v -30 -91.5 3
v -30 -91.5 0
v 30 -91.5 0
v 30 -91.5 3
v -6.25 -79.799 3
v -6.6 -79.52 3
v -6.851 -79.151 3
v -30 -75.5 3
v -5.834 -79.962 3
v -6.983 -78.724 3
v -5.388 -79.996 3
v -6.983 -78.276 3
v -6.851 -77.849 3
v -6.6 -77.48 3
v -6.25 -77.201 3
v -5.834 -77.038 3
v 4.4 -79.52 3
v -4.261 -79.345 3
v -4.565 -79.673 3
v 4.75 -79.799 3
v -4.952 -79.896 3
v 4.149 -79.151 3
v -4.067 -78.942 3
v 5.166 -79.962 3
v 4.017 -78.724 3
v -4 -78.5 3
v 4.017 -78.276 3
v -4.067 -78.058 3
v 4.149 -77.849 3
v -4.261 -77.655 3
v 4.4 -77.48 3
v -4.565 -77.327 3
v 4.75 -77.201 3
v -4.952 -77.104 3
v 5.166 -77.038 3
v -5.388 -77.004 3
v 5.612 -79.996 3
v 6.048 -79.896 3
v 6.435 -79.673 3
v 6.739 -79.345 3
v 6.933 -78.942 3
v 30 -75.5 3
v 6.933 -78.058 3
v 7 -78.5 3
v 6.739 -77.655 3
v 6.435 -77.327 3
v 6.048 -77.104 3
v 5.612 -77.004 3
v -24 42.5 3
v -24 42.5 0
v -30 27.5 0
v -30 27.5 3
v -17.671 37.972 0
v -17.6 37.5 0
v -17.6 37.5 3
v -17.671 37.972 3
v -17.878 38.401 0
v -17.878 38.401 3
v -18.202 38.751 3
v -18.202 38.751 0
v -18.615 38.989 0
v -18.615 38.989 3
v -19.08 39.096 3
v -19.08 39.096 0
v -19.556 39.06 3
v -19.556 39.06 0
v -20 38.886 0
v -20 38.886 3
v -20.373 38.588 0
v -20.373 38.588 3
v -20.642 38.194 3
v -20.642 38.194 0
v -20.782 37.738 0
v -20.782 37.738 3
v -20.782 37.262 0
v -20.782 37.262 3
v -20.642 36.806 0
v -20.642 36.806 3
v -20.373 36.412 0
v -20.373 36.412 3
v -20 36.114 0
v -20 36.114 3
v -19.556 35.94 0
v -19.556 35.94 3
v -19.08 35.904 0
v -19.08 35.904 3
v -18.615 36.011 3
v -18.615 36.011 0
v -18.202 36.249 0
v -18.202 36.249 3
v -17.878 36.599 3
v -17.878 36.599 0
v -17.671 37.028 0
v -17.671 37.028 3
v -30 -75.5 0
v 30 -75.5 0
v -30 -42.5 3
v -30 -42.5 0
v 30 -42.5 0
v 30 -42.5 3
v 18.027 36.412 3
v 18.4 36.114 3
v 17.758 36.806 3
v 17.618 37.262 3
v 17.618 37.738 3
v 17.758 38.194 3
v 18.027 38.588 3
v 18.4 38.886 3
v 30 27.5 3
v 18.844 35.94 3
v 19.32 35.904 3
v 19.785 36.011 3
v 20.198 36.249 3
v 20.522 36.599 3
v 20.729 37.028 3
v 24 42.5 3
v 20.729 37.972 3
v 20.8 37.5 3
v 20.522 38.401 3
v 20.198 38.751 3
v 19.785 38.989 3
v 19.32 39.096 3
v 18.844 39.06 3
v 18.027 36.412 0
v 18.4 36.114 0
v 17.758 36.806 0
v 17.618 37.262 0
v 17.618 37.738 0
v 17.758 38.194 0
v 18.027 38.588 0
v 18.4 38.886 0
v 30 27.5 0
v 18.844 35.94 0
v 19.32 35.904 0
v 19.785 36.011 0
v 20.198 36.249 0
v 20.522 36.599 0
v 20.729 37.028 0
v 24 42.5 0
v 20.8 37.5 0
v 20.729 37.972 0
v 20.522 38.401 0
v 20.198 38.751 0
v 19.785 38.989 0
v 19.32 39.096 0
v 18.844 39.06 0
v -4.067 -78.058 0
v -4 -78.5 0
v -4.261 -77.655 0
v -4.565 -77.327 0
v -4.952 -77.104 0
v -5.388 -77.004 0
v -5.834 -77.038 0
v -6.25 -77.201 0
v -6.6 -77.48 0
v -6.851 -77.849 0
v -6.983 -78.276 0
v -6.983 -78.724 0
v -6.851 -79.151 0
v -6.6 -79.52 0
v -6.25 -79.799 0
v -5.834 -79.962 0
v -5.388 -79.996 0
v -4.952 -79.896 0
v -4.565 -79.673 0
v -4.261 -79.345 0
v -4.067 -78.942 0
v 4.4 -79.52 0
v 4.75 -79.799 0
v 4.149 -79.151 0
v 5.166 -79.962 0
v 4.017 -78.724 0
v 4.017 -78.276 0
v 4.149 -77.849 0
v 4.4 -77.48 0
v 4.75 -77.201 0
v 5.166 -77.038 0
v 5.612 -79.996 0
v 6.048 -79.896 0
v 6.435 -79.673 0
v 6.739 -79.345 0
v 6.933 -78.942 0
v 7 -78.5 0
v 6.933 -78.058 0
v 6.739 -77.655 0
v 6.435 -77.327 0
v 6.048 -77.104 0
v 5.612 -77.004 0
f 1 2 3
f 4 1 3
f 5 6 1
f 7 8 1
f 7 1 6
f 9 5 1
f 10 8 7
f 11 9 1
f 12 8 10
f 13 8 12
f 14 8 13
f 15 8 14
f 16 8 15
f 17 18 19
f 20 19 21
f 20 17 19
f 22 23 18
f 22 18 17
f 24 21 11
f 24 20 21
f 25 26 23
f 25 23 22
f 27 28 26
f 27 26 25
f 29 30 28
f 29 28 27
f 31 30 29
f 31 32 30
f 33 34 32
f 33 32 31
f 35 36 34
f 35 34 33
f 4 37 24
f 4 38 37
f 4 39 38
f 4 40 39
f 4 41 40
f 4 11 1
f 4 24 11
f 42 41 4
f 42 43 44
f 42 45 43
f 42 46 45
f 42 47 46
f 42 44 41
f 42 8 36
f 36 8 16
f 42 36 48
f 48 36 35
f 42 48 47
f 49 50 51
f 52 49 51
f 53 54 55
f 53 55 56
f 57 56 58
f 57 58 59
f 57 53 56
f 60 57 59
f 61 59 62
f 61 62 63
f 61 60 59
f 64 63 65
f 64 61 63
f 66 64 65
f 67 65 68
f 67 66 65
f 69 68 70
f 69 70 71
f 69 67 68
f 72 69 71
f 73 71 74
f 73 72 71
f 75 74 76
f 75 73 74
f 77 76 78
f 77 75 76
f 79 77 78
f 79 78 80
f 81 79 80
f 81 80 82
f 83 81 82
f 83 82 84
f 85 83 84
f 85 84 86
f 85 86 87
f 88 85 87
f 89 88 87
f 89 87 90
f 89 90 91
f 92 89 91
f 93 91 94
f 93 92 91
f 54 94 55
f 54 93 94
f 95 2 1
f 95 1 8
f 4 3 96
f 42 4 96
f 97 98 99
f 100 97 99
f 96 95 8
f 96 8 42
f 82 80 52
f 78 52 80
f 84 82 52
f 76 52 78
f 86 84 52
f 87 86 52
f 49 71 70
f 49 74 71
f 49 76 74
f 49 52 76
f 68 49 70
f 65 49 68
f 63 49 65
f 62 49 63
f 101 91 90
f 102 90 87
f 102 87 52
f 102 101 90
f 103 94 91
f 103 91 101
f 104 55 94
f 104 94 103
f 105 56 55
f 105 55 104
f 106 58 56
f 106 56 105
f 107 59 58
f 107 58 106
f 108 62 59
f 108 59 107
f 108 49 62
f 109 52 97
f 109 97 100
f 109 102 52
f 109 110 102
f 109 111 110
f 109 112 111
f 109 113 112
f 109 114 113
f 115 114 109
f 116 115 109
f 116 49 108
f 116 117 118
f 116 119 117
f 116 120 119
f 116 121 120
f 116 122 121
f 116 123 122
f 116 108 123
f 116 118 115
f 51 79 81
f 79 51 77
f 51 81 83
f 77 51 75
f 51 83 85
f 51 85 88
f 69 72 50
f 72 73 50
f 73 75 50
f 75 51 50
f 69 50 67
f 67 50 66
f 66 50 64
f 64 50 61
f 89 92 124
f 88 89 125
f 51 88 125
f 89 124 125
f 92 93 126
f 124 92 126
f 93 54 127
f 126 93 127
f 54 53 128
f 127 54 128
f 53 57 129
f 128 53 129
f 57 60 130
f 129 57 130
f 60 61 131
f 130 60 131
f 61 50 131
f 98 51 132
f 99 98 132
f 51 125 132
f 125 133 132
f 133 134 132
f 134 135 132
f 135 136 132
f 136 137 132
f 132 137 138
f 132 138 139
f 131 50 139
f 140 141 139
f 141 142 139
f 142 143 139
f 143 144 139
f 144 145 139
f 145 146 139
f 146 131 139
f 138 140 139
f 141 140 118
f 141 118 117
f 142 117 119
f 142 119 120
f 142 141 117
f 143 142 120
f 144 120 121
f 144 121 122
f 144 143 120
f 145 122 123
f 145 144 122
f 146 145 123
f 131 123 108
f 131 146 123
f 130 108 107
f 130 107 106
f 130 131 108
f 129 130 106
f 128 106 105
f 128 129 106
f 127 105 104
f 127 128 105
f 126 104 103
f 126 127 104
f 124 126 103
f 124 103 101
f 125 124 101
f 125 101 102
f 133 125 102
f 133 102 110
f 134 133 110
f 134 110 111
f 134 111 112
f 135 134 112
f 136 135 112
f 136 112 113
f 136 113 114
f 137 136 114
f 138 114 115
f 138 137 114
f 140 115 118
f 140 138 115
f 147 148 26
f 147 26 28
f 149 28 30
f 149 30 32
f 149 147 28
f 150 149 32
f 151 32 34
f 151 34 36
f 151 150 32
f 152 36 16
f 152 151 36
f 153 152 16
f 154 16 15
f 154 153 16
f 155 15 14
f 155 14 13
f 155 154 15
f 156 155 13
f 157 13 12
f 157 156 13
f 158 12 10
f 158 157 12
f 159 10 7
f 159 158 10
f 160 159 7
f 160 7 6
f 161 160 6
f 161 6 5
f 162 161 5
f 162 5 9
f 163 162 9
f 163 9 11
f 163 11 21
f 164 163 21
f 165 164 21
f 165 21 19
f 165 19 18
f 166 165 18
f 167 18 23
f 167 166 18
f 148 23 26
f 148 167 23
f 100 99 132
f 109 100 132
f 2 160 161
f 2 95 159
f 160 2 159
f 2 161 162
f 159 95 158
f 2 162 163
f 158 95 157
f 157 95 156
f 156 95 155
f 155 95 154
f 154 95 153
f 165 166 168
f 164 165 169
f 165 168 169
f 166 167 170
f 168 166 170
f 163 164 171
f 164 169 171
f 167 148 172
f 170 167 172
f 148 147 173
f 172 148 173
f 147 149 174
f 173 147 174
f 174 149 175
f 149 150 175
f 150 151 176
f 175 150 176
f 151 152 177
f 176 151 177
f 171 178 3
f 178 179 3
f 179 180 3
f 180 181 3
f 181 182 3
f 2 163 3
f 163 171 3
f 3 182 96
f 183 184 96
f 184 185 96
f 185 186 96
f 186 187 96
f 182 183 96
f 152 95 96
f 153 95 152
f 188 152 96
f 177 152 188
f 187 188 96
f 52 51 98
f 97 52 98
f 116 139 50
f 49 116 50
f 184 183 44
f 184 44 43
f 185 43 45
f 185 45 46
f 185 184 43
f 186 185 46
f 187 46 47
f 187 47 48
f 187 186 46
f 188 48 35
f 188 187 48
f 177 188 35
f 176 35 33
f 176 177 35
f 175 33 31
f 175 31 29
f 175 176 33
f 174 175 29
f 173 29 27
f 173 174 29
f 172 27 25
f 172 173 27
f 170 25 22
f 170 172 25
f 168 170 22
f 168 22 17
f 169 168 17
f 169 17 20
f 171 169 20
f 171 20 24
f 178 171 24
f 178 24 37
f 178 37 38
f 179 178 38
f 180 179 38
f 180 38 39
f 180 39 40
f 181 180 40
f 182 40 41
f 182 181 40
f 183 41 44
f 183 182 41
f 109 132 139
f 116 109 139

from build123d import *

# Parameters (mm, degrees)
F0_R     = 1.6
F1_DEPTH = 3
F2_W     = 60
F2_H     = 16
F2_R     = 1.5
F3_DEPTH = 3


with BuildPart() as f1:
    # F0 (on Top) → F1 (new body)
    with BuildSketch(Plane.XY):
        Polygon((24, 42.5), (-24, 42.5), (-30, 27.5), (-30, -42.5), (30, -42.5), (30, 27.5), align=None)
        with Locations((-19.2, 37.5)):
            Circle(F0_R, mode=Mode.SUBTRACT)
        with Locations((19.2, 37.5)):
            Circle(F0_R, mode=Mode.SUBTRACT)
    extrude(amount=F1_DEPTH)


with BuildPart() as f3:
    # F2 (on Top) → F3 (new body)
    with BuildSketch(Plane.XY):
        with Locations((0, -83.500003)):
            Rectangle(F2_W, F2_H)
        with Locations((-5.5, -78.500003)):
            Circle(F2_R, mode=Mode.SUBTRACT)
        with Locations((5.5, -78.500003)):
            Circle(F2_R, mode=Mode.SUBTRACT)
    extrude(amount=F3_DEPTH)


solid = Compound([f1.part, f3.part])
